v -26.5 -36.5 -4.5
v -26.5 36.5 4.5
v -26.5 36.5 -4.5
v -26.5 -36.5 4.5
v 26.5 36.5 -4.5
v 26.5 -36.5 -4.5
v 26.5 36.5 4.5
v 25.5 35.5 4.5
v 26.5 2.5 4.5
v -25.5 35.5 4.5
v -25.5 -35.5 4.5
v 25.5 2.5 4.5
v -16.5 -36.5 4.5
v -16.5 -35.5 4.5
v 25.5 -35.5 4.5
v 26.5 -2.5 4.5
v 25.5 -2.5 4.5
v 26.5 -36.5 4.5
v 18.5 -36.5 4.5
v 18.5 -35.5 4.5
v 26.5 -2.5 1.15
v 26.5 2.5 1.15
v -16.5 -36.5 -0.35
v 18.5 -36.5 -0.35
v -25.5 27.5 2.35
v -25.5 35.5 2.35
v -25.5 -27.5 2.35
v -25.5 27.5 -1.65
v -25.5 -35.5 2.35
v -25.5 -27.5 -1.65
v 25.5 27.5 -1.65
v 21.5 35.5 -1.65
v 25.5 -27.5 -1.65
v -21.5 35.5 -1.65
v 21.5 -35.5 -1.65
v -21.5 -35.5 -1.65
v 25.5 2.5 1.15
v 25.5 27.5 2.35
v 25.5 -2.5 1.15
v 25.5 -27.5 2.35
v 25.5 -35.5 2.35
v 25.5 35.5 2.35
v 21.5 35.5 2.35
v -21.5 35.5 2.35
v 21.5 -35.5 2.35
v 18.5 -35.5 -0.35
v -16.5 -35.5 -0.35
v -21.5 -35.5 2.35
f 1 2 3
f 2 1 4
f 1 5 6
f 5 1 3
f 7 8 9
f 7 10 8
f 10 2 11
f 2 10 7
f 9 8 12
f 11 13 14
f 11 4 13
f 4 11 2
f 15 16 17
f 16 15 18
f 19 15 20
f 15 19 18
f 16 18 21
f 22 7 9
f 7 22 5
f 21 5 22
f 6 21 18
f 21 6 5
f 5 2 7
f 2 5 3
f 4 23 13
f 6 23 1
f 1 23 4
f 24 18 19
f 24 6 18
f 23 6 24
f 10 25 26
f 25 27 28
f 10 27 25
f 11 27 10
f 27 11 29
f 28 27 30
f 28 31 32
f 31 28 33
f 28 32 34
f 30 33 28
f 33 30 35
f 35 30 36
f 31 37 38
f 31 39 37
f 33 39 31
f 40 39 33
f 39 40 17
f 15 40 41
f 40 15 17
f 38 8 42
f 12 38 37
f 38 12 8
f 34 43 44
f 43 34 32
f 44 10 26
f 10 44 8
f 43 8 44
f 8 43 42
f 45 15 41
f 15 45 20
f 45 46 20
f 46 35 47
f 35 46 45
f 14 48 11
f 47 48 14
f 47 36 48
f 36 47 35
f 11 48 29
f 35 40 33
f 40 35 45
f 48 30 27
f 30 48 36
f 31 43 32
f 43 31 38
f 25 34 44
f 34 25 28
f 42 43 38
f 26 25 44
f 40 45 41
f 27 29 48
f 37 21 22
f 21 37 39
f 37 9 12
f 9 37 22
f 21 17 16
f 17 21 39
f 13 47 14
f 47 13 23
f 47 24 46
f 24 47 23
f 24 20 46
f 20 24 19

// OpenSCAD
// Project Box  Version 1.0
// Designed by Neil Rieck   21 August 2019 
// Released under the standard open source GNU licence
// No warranties or liabilities accepted as per the licence.
// Use at your own risk.


// Put all the variables for the project first
//  Chassis Inner Dimensions in mm
x = 51;                 // Width
y = 71;                // Length
z = 7;                // Height
Thick = 2;           // Box thickness
Fa= 0.3;            // Ensure Penetration Fine Adjustment

// PCB Standoff Dimensions
PCBSupportx=4;
PCBSupporty=PCBSupportx*2;

// Cutout Dimensions
PCBDepth = 2;                    // depth at which the PCB is held.
COutoffsetx = 4;                //  distance in from PCBSupportx
COutWidthx = 35;               //  Cutout width in the x plane 
COutDepthz = PCBDepth+3;      //  Cutout depth in the z plane
ReliefWidth = 5;             //  Gap in side for prying out the PCB
ReliefDepth = PCBDepth+1.5; // Enough to get a screwdriver tip below the PCB

// Sanity Check
if ((PCBSupportx+COutoffsetx+COutWidthx)>x-PCBSupportx)  { 
    echo("PCBSupportx is too big");
    }

rotate([0,180,0])   // turn it all upside down for 3D print
BuildProject();

// Build the project
module BuildProject(){
    difference(){    
        union() {
        Chassis();
        BuildPCBSupports();
        }
        Cutouts();
    }
}
// The Chassis is the frame about which all of the objects are built. 
// In this application it is a hollow box.
module Chassis() { 
     difference(){
         // outer box dimensions
         translate([0,0,0]) cube([x+Thick,y+Thick,z+Thick], center=true);
         //  cut out for the PCB Inner Dimensions
         translate([0,0,-Thick]) cube([x,y,z+Fa], center=true);   
     }
 }
// PCB Supports - the triangular standoffs in the corners
module BuildPCBSupports(){
    union () {
        PCBSupport();
        mirror([1,0,0])
        PCBSupport(); 
    }
    mirror([0,1,0])
    union () {
        PCBSupport();
        mirror([1,0,0])
        PCBSupport(); 
    }

}
module PCBSupport(){
    translate([-x/2, -y/2, 0]){
         triangle_points =[[0,0],[PCBSupportx,0],[0,PCBSupporty]];
         linear_extrude(height=z+Thick, center = true)
         polygon(triangle_points);
    }
}
//  Cutouts are all of the gaps in the chassis.
module Cutouts(){
    union(){
        PCBRebate();
        Relief();
        Cutout();
    }
}
module PCBRebate(){  //the hollow inside the top of the box to hold the PCB at the PCBDepth.
    translate([-x/2,-y/2,-(z+Thick+Fa)/2]) cube([x,y,PCBDepth+Fa], center=false);  
}
module Relief(){   // Relief Cut to pry out the PCB
    translate([-(x+Thick)/2-Fa,-ReliefWidth/2,-(z+Thick+Fa)/2]) cube([Thick+Fa*2,ReliefWidth,ReliefDepth], center=false);
}
// Cutout for the standoff
module Cutout(){
    translate([-(x+Thick)/2+(COutoffsetx+PCBSupportx) ,-(y+Thick)/2-Fa,-(z+Thick+Fa)/2]) cube([COutWidthx,Thick+Fa*2,COutDepthz], center=false);
}
